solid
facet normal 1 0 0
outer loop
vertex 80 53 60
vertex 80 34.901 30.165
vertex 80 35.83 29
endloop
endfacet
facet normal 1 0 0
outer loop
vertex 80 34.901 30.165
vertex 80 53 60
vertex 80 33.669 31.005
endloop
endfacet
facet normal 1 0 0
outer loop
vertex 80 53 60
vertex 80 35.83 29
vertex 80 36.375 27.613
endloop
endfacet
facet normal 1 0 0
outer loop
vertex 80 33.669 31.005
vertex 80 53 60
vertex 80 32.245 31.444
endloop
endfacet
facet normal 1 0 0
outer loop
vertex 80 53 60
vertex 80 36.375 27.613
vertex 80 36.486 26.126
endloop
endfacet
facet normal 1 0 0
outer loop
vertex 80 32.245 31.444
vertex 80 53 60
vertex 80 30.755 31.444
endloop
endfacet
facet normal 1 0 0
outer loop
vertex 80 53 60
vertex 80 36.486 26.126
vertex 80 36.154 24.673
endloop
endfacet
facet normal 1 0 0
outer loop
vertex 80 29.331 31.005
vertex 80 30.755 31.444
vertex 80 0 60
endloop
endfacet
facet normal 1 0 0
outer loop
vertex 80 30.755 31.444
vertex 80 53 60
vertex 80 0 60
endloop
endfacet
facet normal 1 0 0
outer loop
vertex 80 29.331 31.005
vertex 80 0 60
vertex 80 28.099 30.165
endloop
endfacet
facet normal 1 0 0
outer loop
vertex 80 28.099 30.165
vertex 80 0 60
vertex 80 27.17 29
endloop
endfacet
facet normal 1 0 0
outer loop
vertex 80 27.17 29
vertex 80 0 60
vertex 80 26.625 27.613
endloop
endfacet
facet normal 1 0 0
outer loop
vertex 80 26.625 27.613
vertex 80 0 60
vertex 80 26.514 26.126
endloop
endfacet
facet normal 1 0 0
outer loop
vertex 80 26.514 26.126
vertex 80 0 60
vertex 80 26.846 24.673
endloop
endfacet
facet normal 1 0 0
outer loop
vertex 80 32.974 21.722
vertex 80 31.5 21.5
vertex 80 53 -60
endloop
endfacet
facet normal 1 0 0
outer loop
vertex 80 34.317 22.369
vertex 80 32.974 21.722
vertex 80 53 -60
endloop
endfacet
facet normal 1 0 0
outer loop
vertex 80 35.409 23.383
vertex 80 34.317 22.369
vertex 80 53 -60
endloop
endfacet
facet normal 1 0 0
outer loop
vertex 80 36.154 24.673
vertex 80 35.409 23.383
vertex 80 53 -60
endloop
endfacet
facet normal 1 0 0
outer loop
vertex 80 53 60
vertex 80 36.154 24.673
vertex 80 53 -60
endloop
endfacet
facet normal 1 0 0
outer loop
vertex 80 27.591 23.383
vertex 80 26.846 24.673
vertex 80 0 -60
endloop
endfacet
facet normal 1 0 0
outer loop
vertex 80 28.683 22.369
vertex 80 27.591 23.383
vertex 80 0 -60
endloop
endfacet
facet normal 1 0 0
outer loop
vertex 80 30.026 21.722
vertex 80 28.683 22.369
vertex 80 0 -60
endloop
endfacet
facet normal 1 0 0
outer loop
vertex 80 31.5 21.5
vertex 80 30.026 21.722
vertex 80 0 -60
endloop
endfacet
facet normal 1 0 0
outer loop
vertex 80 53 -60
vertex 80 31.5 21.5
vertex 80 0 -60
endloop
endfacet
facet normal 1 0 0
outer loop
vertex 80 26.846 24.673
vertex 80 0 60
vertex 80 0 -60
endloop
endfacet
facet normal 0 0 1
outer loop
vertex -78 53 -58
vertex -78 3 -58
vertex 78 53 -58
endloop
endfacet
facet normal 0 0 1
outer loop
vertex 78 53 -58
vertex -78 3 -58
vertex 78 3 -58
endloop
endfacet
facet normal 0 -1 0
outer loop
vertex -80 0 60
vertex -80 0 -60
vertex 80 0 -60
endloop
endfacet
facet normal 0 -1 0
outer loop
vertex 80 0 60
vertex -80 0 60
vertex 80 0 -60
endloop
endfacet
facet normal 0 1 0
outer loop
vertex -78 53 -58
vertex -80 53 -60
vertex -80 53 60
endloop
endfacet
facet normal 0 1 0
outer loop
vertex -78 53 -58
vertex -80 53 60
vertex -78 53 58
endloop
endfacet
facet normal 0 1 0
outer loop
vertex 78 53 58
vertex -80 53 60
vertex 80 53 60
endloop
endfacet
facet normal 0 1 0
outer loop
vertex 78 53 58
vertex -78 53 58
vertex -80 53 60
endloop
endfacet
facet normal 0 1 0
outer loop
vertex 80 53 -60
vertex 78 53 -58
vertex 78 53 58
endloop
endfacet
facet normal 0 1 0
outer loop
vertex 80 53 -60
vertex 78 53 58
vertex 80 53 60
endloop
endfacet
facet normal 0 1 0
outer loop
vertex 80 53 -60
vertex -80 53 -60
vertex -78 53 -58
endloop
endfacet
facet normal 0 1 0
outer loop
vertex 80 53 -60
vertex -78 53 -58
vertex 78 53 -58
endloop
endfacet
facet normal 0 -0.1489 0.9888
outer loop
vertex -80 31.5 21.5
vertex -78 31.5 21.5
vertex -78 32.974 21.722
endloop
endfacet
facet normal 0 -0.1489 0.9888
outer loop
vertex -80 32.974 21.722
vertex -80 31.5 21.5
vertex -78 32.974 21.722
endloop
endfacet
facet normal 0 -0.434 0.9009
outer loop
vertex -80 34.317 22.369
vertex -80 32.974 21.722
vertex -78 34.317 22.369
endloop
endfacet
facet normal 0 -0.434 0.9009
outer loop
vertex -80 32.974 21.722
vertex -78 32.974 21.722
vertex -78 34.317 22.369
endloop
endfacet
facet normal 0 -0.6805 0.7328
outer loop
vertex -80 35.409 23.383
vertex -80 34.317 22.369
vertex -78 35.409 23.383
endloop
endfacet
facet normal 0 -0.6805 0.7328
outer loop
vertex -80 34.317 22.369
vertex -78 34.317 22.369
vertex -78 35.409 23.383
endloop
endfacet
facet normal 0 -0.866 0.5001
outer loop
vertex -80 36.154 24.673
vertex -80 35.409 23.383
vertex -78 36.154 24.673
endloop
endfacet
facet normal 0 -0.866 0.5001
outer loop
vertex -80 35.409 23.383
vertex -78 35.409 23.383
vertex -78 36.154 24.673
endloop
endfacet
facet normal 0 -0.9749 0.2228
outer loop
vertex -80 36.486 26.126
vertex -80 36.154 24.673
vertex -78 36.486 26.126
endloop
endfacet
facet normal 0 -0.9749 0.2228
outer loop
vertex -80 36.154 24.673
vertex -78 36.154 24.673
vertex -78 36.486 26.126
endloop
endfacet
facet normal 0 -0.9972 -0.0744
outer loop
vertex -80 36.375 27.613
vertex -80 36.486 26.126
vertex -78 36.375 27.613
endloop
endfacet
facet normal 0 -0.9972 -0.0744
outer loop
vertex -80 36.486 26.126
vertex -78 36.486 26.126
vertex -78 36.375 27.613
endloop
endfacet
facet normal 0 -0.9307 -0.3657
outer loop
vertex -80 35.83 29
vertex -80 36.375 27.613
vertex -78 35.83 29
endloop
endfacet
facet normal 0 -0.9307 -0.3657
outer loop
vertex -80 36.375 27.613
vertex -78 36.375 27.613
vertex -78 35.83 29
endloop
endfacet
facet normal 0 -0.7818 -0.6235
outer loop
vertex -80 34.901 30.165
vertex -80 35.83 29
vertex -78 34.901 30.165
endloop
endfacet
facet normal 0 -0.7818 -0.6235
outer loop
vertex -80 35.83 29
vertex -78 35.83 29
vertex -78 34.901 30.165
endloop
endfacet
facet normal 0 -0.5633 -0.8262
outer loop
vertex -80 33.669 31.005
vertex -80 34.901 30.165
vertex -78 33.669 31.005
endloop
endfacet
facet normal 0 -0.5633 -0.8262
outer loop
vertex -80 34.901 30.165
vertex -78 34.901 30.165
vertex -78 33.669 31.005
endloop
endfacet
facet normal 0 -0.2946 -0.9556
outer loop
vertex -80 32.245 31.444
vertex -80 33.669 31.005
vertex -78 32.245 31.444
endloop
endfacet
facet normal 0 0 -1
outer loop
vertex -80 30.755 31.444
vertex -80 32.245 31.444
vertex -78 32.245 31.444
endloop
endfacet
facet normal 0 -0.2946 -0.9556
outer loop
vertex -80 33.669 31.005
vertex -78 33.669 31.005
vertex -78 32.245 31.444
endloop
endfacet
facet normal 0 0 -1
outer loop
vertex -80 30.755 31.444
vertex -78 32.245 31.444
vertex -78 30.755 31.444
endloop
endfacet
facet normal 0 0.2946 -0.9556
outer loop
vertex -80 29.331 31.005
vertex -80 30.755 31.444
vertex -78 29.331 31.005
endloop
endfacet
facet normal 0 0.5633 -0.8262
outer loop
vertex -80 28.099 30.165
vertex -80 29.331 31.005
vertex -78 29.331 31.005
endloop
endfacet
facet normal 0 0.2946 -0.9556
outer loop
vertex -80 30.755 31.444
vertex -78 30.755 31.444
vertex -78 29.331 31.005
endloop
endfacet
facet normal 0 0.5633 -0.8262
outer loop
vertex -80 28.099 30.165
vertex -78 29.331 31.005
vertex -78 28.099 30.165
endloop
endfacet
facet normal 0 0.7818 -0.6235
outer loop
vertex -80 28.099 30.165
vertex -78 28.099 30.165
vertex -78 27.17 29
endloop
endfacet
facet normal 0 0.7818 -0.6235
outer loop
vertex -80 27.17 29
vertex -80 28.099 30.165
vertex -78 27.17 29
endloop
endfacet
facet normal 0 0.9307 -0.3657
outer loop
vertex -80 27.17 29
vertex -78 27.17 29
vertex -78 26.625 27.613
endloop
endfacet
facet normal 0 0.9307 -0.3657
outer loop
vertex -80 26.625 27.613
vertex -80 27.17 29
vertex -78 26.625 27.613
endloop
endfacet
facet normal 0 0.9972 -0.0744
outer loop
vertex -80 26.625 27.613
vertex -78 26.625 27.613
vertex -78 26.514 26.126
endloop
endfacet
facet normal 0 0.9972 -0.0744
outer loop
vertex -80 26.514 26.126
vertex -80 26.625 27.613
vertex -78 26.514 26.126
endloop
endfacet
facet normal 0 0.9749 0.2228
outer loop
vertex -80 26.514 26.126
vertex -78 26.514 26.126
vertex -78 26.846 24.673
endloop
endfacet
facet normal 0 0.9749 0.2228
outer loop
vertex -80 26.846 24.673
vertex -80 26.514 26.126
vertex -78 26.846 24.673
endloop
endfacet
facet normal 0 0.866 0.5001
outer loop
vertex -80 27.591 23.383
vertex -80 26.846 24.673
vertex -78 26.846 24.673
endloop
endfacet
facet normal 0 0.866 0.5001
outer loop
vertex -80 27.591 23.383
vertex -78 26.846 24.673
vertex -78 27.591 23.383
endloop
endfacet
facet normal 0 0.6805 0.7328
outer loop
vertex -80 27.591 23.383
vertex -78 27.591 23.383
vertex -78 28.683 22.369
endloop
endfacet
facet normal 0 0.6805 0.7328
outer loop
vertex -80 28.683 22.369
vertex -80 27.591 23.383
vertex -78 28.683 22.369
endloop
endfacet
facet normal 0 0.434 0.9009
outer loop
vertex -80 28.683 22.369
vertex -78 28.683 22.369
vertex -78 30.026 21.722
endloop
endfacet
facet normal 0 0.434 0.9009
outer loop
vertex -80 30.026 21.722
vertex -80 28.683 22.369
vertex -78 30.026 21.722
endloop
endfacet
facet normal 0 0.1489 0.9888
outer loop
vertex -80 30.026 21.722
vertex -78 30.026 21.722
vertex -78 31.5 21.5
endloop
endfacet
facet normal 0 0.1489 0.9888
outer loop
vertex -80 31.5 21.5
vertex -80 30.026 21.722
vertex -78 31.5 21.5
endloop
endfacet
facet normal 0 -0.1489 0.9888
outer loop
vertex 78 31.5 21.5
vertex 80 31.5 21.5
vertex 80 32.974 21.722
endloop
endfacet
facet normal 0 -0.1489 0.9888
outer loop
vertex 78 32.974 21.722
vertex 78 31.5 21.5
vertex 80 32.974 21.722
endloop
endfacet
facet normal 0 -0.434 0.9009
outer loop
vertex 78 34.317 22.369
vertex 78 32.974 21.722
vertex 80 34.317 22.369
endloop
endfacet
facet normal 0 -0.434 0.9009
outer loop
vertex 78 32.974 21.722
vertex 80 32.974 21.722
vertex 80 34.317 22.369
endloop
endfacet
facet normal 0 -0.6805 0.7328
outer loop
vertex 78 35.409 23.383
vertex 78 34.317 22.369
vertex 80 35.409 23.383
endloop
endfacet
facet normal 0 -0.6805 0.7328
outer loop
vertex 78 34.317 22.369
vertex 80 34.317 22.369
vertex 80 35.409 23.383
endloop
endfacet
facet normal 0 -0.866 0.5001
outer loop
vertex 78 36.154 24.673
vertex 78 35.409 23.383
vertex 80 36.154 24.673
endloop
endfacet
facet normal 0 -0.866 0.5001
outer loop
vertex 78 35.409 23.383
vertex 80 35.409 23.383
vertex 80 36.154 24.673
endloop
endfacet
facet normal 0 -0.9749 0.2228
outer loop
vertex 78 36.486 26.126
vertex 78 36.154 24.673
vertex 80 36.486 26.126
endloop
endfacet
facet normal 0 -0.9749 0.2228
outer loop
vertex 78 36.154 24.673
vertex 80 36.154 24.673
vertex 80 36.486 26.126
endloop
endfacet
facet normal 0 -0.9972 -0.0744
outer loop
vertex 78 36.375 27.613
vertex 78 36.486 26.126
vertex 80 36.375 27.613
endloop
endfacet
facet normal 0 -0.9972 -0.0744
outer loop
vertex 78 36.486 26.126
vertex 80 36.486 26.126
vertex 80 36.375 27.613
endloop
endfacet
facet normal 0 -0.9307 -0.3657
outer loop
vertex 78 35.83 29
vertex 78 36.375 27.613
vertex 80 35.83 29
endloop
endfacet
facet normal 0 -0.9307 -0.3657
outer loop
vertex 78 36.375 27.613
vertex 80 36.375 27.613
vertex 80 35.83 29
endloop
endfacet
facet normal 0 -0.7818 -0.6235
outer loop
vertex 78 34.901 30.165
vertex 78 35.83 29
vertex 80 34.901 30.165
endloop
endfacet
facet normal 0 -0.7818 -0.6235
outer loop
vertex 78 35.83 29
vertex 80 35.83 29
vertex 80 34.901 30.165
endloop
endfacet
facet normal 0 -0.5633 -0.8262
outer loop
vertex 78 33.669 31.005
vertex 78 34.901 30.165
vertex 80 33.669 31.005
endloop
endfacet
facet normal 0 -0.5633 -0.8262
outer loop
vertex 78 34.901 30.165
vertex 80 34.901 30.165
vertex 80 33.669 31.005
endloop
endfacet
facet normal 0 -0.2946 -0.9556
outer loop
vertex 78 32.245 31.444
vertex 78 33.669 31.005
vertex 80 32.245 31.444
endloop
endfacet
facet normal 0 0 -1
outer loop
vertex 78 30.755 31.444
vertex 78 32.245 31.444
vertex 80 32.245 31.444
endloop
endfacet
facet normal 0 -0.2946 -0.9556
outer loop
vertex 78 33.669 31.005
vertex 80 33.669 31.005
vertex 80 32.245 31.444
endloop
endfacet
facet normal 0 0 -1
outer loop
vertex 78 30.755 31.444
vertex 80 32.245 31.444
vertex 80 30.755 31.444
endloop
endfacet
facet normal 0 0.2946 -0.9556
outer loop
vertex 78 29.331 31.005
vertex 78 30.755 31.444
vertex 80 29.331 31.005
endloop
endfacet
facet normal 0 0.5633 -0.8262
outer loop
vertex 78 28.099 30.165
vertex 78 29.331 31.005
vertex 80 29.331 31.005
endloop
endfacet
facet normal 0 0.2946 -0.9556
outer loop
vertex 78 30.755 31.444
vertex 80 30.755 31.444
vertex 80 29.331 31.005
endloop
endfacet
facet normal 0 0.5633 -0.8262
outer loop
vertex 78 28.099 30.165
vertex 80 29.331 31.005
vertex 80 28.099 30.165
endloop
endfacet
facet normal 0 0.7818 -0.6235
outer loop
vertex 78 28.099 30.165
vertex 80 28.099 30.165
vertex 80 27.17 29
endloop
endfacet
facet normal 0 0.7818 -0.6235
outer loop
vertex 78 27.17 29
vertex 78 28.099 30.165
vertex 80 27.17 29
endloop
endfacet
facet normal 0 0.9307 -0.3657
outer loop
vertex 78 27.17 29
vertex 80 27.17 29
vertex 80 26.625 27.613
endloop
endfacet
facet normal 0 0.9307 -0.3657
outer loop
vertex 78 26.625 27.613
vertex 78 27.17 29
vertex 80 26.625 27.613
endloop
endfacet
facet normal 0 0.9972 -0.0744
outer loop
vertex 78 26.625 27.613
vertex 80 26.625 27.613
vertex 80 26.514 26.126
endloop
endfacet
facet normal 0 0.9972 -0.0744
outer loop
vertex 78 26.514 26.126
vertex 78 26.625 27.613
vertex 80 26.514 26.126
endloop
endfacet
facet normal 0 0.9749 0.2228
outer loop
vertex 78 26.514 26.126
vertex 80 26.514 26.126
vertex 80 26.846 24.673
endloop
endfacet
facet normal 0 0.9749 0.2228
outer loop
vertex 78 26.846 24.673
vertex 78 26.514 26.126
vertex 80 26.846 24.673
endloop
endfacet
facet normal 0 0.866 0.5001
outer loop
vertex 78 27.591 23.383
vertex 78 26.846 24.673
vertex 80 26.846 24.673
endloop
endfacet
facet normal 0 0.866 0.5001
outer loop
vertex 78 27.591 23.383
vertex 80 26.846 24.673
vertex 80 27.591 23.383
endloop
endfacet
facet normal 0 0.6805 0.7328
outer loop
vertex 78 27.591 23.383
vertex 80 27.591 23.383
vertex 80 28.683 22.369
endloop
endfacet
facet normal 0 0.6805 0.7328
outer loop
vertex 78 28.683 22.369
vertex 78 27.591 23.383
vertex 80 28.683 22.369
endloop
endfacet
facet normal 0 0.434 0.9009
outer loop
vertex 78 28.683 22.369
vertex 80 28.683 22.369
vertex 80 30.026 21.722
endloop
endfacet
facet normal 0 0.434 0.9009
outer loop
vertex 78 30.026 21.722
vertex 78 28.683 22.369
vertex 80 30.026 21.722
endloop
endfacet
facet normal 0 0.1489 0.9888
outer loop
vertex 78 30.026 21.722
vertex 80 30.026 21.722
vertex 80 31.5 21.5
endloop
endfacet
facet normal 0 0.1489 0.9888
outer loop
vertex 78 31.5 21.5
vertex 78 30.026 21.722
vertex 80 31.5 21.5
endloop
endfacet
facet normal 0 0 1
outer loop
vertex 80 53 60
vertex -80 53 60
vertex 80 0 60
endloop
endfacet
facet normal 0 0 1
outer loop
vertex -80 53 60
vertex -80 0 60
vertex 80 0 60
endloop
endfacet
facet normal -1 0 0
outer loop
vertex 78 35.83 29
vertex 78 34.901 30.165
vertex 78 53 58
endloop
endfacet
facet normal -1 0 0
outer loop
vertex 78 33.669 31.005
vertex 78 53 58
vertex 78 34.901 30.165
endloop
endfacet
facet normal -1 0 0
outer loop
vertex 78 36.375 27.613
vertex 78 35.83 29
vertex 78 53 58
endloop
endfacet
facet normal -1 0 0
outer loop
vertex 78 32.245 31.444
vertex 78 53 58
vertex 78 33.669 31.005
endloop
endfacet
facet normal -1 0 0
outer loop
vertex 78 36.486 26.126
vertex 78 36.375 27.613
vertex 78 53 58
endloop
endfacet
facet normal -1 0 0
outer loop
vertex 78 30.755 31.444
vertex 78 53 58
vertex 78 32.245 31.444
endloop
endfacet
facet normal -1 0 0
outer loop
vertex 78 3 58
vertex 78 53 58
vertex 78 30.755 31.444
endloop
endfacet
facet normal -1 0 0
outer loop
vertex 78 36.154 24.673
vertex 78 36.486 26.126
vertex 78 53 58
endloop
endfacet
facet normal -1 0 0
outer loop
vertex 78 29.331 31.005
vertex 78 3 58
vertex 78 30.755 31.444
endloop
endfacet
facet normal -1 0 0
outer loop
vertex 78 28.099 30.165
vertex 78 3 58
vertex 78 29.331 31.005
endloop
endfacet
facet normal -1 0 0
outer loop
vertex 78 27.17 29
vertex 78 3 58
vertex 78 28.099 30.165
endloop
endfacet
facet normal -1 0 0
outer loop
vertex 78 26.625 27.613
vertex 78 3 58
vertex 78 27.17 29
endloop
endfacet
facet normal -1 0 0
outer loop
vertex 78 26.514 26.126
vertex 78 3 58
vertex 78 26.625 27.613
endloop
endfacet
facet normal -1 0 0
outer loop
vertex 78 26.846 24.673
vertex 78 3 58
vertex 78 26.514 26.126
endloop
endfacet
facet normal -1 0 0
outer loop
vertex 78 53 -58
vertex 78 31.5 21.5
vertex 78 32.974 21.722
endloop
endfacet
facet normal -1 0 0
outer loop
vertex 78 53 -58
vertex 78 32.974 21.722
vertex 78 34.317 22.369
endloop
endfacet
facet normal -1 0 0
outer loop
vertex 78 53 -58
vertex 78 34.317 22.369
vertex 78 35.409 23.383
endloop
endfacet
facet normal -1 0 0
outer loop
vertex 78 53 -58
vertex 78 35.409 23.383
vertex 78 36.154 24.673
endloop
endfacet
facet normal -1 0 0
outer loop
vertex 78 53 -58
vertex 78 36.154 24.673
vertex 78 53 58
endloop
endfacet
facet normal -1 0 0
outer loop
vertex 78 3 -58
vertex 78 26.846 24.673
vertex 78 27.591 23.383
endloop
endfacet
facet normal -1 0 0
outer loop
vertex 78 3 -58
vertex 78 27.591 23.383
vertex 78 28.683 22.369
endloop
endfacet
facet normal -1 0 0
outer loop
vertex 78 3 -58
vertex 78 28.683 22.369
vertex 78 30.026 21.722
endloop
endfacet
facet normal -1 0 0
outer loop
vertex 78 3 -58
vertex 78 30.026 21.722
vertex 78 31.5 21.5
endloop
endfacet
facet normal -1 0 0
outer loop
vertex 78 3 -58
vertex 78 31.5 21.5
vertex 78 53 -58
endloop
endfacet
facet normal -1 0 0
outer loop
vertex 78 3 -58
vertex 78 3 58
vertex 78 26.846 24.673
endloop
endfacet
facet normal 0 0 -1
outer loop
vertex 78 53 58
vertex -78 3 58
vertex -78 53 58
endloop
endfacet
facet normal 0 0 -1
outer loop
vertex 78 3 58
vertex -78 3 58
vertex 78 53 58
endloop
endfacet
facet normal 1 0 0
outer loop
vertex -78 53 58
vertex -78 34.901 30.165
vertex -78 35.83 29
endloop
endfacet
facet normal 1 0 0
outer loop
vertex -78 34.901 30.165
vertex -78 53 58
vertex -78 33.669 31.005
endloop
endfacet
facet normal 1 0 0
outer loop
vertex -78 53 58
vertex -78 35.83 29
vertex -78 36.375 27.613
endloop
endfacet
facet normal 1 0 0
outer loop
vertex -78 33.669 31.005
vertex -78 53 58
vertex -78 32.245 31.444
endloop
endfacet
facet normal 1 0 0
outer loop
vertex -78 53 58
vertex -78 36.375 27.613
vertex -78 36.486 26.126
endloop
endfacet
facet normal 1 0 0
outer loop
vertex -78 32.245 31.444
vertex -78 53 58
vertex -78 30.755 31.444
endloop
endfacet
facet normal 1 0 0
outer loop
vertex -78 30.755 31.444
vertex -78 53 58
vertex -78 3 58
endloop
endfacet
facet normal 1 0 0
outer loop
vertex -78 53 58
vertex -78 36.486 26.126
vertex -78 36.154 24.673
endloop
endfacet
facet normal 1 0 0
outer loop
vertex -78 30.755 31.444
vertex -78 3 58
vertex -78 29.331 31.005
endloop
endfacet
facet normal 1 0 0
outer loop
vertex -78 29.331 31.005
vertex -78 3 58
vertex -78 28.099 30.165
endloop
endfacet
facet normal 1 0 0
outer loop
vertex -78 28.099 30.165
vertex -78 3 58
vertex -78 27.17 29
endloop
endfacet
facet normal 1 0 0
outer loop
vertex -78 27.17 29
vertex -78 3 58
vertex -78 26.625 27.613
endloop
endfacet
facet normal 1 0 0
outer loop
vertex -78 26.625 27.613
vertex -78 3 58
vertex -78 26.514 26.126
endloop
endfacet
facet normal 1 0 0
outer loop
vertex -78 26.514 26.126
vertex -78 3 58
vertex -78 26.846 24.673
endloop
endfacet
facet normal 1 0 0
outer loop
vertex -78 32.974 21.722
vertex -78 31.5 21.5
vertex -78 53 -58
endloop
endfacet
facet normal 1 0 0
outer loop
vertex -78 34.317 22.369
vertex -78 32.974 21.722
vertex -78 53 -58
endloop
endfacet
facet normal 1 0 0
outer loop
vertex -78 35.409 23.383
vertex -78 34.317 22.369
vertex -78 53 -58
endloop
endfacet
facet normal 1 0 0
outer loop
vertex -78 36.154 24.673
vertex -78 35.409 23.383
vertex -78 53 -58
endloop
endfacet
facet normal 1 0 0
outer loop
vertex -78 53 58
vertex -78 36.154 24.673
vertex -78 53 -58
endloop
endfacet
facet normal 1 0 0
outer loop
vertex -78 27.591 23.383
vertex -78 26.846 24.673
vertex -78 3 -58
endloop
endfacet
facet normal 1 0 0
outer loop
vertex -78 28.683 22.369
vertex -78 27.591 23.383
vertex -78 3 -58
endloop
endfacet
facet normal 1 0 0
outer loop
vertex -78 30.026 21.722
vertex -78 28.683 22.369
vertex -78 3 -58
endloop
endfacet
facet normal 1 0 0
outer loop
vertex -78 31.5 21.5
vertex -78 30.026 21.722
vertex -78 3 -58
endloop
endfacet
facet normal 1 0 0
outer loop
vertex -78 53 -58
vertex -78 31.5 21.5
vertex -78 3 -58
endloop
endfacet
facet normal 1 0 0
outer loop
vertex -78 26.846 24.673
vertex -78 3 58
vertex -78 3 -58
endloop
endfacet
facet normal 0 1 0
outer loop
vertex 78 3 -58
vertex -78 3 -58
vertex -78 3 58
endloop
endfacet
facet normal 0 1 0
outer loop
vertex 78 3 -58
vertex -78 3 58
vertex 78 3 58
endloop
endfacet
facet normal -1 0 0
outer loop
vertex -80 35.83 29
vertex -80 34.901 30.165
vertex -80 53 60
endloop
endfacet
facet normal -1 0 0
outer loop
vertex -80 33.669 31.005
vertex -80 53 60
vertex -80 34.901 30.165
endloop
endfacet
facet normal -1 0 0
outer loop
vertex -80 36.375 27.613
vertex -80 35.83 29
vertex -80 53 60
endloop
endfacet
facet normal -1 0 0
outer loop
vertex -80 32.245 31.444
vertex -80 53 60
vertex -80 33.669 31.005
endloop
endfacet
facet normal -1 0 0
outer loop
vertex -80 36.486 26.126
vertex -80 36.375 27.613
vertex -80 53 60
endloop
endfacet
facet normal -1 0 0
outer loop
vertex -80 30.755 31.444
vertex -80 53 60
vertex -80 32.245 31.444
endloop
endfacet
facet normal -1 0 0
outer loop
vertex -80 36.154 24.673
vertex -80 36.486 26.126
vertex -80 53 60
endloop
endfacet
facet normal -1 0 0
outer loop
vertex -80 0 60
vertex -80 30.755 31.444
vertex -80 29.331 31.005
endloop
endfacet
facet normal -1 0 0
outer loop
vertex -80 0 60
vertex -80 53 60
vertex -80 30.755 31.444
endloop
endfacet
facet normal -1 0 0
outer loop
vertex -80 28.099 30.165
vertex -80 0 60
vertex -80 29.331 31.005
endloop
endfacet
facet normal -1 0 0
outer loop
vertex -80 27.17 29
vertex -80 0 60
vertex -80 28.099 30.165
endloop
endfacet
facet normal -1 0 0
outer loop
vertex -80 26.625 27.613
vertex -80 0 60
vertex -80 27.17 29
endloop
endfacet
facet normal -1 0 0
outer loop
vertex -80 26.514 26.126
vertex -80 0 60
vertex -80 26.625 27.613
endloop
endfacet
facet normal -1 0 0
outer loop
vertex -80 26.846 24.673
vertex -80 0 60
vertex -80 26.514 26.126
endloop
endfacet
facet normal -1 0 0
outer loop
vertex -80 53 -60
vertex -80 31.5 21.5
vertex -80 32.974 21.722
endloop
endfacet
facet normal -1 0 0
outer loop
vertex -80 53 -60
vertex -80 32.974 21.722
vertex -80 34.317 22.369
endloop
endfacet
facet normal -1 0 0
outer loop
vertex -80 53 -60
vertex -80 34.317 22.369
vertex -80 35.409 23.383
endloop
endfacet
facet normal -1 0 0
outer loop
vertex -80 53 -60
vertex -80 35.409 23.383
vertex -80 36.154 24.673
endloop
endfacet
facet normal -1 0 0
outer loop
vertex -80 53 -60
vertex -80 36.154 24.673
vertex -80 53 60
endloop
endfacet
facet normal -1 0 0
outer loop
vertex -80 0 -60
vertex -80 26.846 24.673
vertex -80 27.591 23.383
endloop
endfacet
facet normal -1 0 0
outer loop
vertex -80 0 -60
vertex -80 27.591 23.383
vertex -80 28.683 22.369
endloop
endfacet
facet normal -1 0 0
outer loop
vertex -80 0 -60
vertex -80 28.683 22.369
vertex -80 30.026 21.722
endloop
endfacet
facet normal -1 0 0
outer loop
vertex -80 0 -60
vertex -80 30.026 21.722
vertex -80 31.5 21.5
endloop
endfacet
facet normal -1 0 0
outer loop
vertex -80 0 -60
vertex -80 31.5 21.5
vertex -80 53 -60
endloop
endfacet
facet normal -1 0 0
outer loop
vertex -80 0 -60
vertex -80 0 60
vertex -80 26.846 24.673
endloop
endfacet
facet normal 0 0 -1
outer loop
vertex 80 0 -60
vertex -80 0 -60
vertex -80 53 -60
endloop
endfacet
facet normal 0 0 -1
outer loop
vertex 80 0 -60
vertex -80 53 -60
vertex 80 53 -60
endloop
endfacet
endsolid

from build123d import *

# Parameters (mm, degrees)
SKETCH1_W           = 160
SKETCH1_H           = 120
BOSS_EXTRUDE1_DEPTH = 3
SKETCH2_W           = 160
SKETCH2_H           = 120
SKETCH2_W_2         = 156
SKETCH2_H_2         = 116
BOSS_EXTRUDE2_DEPTH = 50
SKETCH3_R           = 5
CUT_EXTRUDE1_DEPTH  = 179.910592196


with BuildPart() as part:
    # Sketch1 → Boss-Extrude1 (new body)
    with BuildSketch(Plane(origin=(0, 0, 0), x_dir=(1, 0, 0), z_dir=(0, 1, 0))):
        Rectangle(SKETCH1_W, SKETCH1_H)
    extrude(amount=BOSS_EXTRUDE1_DEPTH)

    # Sketch2 → Boss-Extrude2 (add)
    with BuildSketch(Plane(origin=(0, 3, 0), x_dir=(1, 0, 0), z_dir=(0, 1, 0))):
        Rectangle(SKETCH2_W, SKETCH2_H)
        Rectangle(SKETCH2_W_2, SKETCH2_H_2, mode=Mode.SUBTRACT)
    extrude(amount=BOSS_EXTRUDE2_DEPTH)

    # Sketch3 → Cut-Extrude1 (cut, through all)
    with BuildSketch(Plane(origin=(80, 0, 0), x_dir=(0, 0, -1), z_dir=(1, 0, 0))):
        with Locations((-26.5, 31.5)):
            Circle(SKETCH3_R)
    extrude(amount=-CUT_EXTRUDE1_DEPTH, mode=Mode.SUBTRACT)


solid = part.part
